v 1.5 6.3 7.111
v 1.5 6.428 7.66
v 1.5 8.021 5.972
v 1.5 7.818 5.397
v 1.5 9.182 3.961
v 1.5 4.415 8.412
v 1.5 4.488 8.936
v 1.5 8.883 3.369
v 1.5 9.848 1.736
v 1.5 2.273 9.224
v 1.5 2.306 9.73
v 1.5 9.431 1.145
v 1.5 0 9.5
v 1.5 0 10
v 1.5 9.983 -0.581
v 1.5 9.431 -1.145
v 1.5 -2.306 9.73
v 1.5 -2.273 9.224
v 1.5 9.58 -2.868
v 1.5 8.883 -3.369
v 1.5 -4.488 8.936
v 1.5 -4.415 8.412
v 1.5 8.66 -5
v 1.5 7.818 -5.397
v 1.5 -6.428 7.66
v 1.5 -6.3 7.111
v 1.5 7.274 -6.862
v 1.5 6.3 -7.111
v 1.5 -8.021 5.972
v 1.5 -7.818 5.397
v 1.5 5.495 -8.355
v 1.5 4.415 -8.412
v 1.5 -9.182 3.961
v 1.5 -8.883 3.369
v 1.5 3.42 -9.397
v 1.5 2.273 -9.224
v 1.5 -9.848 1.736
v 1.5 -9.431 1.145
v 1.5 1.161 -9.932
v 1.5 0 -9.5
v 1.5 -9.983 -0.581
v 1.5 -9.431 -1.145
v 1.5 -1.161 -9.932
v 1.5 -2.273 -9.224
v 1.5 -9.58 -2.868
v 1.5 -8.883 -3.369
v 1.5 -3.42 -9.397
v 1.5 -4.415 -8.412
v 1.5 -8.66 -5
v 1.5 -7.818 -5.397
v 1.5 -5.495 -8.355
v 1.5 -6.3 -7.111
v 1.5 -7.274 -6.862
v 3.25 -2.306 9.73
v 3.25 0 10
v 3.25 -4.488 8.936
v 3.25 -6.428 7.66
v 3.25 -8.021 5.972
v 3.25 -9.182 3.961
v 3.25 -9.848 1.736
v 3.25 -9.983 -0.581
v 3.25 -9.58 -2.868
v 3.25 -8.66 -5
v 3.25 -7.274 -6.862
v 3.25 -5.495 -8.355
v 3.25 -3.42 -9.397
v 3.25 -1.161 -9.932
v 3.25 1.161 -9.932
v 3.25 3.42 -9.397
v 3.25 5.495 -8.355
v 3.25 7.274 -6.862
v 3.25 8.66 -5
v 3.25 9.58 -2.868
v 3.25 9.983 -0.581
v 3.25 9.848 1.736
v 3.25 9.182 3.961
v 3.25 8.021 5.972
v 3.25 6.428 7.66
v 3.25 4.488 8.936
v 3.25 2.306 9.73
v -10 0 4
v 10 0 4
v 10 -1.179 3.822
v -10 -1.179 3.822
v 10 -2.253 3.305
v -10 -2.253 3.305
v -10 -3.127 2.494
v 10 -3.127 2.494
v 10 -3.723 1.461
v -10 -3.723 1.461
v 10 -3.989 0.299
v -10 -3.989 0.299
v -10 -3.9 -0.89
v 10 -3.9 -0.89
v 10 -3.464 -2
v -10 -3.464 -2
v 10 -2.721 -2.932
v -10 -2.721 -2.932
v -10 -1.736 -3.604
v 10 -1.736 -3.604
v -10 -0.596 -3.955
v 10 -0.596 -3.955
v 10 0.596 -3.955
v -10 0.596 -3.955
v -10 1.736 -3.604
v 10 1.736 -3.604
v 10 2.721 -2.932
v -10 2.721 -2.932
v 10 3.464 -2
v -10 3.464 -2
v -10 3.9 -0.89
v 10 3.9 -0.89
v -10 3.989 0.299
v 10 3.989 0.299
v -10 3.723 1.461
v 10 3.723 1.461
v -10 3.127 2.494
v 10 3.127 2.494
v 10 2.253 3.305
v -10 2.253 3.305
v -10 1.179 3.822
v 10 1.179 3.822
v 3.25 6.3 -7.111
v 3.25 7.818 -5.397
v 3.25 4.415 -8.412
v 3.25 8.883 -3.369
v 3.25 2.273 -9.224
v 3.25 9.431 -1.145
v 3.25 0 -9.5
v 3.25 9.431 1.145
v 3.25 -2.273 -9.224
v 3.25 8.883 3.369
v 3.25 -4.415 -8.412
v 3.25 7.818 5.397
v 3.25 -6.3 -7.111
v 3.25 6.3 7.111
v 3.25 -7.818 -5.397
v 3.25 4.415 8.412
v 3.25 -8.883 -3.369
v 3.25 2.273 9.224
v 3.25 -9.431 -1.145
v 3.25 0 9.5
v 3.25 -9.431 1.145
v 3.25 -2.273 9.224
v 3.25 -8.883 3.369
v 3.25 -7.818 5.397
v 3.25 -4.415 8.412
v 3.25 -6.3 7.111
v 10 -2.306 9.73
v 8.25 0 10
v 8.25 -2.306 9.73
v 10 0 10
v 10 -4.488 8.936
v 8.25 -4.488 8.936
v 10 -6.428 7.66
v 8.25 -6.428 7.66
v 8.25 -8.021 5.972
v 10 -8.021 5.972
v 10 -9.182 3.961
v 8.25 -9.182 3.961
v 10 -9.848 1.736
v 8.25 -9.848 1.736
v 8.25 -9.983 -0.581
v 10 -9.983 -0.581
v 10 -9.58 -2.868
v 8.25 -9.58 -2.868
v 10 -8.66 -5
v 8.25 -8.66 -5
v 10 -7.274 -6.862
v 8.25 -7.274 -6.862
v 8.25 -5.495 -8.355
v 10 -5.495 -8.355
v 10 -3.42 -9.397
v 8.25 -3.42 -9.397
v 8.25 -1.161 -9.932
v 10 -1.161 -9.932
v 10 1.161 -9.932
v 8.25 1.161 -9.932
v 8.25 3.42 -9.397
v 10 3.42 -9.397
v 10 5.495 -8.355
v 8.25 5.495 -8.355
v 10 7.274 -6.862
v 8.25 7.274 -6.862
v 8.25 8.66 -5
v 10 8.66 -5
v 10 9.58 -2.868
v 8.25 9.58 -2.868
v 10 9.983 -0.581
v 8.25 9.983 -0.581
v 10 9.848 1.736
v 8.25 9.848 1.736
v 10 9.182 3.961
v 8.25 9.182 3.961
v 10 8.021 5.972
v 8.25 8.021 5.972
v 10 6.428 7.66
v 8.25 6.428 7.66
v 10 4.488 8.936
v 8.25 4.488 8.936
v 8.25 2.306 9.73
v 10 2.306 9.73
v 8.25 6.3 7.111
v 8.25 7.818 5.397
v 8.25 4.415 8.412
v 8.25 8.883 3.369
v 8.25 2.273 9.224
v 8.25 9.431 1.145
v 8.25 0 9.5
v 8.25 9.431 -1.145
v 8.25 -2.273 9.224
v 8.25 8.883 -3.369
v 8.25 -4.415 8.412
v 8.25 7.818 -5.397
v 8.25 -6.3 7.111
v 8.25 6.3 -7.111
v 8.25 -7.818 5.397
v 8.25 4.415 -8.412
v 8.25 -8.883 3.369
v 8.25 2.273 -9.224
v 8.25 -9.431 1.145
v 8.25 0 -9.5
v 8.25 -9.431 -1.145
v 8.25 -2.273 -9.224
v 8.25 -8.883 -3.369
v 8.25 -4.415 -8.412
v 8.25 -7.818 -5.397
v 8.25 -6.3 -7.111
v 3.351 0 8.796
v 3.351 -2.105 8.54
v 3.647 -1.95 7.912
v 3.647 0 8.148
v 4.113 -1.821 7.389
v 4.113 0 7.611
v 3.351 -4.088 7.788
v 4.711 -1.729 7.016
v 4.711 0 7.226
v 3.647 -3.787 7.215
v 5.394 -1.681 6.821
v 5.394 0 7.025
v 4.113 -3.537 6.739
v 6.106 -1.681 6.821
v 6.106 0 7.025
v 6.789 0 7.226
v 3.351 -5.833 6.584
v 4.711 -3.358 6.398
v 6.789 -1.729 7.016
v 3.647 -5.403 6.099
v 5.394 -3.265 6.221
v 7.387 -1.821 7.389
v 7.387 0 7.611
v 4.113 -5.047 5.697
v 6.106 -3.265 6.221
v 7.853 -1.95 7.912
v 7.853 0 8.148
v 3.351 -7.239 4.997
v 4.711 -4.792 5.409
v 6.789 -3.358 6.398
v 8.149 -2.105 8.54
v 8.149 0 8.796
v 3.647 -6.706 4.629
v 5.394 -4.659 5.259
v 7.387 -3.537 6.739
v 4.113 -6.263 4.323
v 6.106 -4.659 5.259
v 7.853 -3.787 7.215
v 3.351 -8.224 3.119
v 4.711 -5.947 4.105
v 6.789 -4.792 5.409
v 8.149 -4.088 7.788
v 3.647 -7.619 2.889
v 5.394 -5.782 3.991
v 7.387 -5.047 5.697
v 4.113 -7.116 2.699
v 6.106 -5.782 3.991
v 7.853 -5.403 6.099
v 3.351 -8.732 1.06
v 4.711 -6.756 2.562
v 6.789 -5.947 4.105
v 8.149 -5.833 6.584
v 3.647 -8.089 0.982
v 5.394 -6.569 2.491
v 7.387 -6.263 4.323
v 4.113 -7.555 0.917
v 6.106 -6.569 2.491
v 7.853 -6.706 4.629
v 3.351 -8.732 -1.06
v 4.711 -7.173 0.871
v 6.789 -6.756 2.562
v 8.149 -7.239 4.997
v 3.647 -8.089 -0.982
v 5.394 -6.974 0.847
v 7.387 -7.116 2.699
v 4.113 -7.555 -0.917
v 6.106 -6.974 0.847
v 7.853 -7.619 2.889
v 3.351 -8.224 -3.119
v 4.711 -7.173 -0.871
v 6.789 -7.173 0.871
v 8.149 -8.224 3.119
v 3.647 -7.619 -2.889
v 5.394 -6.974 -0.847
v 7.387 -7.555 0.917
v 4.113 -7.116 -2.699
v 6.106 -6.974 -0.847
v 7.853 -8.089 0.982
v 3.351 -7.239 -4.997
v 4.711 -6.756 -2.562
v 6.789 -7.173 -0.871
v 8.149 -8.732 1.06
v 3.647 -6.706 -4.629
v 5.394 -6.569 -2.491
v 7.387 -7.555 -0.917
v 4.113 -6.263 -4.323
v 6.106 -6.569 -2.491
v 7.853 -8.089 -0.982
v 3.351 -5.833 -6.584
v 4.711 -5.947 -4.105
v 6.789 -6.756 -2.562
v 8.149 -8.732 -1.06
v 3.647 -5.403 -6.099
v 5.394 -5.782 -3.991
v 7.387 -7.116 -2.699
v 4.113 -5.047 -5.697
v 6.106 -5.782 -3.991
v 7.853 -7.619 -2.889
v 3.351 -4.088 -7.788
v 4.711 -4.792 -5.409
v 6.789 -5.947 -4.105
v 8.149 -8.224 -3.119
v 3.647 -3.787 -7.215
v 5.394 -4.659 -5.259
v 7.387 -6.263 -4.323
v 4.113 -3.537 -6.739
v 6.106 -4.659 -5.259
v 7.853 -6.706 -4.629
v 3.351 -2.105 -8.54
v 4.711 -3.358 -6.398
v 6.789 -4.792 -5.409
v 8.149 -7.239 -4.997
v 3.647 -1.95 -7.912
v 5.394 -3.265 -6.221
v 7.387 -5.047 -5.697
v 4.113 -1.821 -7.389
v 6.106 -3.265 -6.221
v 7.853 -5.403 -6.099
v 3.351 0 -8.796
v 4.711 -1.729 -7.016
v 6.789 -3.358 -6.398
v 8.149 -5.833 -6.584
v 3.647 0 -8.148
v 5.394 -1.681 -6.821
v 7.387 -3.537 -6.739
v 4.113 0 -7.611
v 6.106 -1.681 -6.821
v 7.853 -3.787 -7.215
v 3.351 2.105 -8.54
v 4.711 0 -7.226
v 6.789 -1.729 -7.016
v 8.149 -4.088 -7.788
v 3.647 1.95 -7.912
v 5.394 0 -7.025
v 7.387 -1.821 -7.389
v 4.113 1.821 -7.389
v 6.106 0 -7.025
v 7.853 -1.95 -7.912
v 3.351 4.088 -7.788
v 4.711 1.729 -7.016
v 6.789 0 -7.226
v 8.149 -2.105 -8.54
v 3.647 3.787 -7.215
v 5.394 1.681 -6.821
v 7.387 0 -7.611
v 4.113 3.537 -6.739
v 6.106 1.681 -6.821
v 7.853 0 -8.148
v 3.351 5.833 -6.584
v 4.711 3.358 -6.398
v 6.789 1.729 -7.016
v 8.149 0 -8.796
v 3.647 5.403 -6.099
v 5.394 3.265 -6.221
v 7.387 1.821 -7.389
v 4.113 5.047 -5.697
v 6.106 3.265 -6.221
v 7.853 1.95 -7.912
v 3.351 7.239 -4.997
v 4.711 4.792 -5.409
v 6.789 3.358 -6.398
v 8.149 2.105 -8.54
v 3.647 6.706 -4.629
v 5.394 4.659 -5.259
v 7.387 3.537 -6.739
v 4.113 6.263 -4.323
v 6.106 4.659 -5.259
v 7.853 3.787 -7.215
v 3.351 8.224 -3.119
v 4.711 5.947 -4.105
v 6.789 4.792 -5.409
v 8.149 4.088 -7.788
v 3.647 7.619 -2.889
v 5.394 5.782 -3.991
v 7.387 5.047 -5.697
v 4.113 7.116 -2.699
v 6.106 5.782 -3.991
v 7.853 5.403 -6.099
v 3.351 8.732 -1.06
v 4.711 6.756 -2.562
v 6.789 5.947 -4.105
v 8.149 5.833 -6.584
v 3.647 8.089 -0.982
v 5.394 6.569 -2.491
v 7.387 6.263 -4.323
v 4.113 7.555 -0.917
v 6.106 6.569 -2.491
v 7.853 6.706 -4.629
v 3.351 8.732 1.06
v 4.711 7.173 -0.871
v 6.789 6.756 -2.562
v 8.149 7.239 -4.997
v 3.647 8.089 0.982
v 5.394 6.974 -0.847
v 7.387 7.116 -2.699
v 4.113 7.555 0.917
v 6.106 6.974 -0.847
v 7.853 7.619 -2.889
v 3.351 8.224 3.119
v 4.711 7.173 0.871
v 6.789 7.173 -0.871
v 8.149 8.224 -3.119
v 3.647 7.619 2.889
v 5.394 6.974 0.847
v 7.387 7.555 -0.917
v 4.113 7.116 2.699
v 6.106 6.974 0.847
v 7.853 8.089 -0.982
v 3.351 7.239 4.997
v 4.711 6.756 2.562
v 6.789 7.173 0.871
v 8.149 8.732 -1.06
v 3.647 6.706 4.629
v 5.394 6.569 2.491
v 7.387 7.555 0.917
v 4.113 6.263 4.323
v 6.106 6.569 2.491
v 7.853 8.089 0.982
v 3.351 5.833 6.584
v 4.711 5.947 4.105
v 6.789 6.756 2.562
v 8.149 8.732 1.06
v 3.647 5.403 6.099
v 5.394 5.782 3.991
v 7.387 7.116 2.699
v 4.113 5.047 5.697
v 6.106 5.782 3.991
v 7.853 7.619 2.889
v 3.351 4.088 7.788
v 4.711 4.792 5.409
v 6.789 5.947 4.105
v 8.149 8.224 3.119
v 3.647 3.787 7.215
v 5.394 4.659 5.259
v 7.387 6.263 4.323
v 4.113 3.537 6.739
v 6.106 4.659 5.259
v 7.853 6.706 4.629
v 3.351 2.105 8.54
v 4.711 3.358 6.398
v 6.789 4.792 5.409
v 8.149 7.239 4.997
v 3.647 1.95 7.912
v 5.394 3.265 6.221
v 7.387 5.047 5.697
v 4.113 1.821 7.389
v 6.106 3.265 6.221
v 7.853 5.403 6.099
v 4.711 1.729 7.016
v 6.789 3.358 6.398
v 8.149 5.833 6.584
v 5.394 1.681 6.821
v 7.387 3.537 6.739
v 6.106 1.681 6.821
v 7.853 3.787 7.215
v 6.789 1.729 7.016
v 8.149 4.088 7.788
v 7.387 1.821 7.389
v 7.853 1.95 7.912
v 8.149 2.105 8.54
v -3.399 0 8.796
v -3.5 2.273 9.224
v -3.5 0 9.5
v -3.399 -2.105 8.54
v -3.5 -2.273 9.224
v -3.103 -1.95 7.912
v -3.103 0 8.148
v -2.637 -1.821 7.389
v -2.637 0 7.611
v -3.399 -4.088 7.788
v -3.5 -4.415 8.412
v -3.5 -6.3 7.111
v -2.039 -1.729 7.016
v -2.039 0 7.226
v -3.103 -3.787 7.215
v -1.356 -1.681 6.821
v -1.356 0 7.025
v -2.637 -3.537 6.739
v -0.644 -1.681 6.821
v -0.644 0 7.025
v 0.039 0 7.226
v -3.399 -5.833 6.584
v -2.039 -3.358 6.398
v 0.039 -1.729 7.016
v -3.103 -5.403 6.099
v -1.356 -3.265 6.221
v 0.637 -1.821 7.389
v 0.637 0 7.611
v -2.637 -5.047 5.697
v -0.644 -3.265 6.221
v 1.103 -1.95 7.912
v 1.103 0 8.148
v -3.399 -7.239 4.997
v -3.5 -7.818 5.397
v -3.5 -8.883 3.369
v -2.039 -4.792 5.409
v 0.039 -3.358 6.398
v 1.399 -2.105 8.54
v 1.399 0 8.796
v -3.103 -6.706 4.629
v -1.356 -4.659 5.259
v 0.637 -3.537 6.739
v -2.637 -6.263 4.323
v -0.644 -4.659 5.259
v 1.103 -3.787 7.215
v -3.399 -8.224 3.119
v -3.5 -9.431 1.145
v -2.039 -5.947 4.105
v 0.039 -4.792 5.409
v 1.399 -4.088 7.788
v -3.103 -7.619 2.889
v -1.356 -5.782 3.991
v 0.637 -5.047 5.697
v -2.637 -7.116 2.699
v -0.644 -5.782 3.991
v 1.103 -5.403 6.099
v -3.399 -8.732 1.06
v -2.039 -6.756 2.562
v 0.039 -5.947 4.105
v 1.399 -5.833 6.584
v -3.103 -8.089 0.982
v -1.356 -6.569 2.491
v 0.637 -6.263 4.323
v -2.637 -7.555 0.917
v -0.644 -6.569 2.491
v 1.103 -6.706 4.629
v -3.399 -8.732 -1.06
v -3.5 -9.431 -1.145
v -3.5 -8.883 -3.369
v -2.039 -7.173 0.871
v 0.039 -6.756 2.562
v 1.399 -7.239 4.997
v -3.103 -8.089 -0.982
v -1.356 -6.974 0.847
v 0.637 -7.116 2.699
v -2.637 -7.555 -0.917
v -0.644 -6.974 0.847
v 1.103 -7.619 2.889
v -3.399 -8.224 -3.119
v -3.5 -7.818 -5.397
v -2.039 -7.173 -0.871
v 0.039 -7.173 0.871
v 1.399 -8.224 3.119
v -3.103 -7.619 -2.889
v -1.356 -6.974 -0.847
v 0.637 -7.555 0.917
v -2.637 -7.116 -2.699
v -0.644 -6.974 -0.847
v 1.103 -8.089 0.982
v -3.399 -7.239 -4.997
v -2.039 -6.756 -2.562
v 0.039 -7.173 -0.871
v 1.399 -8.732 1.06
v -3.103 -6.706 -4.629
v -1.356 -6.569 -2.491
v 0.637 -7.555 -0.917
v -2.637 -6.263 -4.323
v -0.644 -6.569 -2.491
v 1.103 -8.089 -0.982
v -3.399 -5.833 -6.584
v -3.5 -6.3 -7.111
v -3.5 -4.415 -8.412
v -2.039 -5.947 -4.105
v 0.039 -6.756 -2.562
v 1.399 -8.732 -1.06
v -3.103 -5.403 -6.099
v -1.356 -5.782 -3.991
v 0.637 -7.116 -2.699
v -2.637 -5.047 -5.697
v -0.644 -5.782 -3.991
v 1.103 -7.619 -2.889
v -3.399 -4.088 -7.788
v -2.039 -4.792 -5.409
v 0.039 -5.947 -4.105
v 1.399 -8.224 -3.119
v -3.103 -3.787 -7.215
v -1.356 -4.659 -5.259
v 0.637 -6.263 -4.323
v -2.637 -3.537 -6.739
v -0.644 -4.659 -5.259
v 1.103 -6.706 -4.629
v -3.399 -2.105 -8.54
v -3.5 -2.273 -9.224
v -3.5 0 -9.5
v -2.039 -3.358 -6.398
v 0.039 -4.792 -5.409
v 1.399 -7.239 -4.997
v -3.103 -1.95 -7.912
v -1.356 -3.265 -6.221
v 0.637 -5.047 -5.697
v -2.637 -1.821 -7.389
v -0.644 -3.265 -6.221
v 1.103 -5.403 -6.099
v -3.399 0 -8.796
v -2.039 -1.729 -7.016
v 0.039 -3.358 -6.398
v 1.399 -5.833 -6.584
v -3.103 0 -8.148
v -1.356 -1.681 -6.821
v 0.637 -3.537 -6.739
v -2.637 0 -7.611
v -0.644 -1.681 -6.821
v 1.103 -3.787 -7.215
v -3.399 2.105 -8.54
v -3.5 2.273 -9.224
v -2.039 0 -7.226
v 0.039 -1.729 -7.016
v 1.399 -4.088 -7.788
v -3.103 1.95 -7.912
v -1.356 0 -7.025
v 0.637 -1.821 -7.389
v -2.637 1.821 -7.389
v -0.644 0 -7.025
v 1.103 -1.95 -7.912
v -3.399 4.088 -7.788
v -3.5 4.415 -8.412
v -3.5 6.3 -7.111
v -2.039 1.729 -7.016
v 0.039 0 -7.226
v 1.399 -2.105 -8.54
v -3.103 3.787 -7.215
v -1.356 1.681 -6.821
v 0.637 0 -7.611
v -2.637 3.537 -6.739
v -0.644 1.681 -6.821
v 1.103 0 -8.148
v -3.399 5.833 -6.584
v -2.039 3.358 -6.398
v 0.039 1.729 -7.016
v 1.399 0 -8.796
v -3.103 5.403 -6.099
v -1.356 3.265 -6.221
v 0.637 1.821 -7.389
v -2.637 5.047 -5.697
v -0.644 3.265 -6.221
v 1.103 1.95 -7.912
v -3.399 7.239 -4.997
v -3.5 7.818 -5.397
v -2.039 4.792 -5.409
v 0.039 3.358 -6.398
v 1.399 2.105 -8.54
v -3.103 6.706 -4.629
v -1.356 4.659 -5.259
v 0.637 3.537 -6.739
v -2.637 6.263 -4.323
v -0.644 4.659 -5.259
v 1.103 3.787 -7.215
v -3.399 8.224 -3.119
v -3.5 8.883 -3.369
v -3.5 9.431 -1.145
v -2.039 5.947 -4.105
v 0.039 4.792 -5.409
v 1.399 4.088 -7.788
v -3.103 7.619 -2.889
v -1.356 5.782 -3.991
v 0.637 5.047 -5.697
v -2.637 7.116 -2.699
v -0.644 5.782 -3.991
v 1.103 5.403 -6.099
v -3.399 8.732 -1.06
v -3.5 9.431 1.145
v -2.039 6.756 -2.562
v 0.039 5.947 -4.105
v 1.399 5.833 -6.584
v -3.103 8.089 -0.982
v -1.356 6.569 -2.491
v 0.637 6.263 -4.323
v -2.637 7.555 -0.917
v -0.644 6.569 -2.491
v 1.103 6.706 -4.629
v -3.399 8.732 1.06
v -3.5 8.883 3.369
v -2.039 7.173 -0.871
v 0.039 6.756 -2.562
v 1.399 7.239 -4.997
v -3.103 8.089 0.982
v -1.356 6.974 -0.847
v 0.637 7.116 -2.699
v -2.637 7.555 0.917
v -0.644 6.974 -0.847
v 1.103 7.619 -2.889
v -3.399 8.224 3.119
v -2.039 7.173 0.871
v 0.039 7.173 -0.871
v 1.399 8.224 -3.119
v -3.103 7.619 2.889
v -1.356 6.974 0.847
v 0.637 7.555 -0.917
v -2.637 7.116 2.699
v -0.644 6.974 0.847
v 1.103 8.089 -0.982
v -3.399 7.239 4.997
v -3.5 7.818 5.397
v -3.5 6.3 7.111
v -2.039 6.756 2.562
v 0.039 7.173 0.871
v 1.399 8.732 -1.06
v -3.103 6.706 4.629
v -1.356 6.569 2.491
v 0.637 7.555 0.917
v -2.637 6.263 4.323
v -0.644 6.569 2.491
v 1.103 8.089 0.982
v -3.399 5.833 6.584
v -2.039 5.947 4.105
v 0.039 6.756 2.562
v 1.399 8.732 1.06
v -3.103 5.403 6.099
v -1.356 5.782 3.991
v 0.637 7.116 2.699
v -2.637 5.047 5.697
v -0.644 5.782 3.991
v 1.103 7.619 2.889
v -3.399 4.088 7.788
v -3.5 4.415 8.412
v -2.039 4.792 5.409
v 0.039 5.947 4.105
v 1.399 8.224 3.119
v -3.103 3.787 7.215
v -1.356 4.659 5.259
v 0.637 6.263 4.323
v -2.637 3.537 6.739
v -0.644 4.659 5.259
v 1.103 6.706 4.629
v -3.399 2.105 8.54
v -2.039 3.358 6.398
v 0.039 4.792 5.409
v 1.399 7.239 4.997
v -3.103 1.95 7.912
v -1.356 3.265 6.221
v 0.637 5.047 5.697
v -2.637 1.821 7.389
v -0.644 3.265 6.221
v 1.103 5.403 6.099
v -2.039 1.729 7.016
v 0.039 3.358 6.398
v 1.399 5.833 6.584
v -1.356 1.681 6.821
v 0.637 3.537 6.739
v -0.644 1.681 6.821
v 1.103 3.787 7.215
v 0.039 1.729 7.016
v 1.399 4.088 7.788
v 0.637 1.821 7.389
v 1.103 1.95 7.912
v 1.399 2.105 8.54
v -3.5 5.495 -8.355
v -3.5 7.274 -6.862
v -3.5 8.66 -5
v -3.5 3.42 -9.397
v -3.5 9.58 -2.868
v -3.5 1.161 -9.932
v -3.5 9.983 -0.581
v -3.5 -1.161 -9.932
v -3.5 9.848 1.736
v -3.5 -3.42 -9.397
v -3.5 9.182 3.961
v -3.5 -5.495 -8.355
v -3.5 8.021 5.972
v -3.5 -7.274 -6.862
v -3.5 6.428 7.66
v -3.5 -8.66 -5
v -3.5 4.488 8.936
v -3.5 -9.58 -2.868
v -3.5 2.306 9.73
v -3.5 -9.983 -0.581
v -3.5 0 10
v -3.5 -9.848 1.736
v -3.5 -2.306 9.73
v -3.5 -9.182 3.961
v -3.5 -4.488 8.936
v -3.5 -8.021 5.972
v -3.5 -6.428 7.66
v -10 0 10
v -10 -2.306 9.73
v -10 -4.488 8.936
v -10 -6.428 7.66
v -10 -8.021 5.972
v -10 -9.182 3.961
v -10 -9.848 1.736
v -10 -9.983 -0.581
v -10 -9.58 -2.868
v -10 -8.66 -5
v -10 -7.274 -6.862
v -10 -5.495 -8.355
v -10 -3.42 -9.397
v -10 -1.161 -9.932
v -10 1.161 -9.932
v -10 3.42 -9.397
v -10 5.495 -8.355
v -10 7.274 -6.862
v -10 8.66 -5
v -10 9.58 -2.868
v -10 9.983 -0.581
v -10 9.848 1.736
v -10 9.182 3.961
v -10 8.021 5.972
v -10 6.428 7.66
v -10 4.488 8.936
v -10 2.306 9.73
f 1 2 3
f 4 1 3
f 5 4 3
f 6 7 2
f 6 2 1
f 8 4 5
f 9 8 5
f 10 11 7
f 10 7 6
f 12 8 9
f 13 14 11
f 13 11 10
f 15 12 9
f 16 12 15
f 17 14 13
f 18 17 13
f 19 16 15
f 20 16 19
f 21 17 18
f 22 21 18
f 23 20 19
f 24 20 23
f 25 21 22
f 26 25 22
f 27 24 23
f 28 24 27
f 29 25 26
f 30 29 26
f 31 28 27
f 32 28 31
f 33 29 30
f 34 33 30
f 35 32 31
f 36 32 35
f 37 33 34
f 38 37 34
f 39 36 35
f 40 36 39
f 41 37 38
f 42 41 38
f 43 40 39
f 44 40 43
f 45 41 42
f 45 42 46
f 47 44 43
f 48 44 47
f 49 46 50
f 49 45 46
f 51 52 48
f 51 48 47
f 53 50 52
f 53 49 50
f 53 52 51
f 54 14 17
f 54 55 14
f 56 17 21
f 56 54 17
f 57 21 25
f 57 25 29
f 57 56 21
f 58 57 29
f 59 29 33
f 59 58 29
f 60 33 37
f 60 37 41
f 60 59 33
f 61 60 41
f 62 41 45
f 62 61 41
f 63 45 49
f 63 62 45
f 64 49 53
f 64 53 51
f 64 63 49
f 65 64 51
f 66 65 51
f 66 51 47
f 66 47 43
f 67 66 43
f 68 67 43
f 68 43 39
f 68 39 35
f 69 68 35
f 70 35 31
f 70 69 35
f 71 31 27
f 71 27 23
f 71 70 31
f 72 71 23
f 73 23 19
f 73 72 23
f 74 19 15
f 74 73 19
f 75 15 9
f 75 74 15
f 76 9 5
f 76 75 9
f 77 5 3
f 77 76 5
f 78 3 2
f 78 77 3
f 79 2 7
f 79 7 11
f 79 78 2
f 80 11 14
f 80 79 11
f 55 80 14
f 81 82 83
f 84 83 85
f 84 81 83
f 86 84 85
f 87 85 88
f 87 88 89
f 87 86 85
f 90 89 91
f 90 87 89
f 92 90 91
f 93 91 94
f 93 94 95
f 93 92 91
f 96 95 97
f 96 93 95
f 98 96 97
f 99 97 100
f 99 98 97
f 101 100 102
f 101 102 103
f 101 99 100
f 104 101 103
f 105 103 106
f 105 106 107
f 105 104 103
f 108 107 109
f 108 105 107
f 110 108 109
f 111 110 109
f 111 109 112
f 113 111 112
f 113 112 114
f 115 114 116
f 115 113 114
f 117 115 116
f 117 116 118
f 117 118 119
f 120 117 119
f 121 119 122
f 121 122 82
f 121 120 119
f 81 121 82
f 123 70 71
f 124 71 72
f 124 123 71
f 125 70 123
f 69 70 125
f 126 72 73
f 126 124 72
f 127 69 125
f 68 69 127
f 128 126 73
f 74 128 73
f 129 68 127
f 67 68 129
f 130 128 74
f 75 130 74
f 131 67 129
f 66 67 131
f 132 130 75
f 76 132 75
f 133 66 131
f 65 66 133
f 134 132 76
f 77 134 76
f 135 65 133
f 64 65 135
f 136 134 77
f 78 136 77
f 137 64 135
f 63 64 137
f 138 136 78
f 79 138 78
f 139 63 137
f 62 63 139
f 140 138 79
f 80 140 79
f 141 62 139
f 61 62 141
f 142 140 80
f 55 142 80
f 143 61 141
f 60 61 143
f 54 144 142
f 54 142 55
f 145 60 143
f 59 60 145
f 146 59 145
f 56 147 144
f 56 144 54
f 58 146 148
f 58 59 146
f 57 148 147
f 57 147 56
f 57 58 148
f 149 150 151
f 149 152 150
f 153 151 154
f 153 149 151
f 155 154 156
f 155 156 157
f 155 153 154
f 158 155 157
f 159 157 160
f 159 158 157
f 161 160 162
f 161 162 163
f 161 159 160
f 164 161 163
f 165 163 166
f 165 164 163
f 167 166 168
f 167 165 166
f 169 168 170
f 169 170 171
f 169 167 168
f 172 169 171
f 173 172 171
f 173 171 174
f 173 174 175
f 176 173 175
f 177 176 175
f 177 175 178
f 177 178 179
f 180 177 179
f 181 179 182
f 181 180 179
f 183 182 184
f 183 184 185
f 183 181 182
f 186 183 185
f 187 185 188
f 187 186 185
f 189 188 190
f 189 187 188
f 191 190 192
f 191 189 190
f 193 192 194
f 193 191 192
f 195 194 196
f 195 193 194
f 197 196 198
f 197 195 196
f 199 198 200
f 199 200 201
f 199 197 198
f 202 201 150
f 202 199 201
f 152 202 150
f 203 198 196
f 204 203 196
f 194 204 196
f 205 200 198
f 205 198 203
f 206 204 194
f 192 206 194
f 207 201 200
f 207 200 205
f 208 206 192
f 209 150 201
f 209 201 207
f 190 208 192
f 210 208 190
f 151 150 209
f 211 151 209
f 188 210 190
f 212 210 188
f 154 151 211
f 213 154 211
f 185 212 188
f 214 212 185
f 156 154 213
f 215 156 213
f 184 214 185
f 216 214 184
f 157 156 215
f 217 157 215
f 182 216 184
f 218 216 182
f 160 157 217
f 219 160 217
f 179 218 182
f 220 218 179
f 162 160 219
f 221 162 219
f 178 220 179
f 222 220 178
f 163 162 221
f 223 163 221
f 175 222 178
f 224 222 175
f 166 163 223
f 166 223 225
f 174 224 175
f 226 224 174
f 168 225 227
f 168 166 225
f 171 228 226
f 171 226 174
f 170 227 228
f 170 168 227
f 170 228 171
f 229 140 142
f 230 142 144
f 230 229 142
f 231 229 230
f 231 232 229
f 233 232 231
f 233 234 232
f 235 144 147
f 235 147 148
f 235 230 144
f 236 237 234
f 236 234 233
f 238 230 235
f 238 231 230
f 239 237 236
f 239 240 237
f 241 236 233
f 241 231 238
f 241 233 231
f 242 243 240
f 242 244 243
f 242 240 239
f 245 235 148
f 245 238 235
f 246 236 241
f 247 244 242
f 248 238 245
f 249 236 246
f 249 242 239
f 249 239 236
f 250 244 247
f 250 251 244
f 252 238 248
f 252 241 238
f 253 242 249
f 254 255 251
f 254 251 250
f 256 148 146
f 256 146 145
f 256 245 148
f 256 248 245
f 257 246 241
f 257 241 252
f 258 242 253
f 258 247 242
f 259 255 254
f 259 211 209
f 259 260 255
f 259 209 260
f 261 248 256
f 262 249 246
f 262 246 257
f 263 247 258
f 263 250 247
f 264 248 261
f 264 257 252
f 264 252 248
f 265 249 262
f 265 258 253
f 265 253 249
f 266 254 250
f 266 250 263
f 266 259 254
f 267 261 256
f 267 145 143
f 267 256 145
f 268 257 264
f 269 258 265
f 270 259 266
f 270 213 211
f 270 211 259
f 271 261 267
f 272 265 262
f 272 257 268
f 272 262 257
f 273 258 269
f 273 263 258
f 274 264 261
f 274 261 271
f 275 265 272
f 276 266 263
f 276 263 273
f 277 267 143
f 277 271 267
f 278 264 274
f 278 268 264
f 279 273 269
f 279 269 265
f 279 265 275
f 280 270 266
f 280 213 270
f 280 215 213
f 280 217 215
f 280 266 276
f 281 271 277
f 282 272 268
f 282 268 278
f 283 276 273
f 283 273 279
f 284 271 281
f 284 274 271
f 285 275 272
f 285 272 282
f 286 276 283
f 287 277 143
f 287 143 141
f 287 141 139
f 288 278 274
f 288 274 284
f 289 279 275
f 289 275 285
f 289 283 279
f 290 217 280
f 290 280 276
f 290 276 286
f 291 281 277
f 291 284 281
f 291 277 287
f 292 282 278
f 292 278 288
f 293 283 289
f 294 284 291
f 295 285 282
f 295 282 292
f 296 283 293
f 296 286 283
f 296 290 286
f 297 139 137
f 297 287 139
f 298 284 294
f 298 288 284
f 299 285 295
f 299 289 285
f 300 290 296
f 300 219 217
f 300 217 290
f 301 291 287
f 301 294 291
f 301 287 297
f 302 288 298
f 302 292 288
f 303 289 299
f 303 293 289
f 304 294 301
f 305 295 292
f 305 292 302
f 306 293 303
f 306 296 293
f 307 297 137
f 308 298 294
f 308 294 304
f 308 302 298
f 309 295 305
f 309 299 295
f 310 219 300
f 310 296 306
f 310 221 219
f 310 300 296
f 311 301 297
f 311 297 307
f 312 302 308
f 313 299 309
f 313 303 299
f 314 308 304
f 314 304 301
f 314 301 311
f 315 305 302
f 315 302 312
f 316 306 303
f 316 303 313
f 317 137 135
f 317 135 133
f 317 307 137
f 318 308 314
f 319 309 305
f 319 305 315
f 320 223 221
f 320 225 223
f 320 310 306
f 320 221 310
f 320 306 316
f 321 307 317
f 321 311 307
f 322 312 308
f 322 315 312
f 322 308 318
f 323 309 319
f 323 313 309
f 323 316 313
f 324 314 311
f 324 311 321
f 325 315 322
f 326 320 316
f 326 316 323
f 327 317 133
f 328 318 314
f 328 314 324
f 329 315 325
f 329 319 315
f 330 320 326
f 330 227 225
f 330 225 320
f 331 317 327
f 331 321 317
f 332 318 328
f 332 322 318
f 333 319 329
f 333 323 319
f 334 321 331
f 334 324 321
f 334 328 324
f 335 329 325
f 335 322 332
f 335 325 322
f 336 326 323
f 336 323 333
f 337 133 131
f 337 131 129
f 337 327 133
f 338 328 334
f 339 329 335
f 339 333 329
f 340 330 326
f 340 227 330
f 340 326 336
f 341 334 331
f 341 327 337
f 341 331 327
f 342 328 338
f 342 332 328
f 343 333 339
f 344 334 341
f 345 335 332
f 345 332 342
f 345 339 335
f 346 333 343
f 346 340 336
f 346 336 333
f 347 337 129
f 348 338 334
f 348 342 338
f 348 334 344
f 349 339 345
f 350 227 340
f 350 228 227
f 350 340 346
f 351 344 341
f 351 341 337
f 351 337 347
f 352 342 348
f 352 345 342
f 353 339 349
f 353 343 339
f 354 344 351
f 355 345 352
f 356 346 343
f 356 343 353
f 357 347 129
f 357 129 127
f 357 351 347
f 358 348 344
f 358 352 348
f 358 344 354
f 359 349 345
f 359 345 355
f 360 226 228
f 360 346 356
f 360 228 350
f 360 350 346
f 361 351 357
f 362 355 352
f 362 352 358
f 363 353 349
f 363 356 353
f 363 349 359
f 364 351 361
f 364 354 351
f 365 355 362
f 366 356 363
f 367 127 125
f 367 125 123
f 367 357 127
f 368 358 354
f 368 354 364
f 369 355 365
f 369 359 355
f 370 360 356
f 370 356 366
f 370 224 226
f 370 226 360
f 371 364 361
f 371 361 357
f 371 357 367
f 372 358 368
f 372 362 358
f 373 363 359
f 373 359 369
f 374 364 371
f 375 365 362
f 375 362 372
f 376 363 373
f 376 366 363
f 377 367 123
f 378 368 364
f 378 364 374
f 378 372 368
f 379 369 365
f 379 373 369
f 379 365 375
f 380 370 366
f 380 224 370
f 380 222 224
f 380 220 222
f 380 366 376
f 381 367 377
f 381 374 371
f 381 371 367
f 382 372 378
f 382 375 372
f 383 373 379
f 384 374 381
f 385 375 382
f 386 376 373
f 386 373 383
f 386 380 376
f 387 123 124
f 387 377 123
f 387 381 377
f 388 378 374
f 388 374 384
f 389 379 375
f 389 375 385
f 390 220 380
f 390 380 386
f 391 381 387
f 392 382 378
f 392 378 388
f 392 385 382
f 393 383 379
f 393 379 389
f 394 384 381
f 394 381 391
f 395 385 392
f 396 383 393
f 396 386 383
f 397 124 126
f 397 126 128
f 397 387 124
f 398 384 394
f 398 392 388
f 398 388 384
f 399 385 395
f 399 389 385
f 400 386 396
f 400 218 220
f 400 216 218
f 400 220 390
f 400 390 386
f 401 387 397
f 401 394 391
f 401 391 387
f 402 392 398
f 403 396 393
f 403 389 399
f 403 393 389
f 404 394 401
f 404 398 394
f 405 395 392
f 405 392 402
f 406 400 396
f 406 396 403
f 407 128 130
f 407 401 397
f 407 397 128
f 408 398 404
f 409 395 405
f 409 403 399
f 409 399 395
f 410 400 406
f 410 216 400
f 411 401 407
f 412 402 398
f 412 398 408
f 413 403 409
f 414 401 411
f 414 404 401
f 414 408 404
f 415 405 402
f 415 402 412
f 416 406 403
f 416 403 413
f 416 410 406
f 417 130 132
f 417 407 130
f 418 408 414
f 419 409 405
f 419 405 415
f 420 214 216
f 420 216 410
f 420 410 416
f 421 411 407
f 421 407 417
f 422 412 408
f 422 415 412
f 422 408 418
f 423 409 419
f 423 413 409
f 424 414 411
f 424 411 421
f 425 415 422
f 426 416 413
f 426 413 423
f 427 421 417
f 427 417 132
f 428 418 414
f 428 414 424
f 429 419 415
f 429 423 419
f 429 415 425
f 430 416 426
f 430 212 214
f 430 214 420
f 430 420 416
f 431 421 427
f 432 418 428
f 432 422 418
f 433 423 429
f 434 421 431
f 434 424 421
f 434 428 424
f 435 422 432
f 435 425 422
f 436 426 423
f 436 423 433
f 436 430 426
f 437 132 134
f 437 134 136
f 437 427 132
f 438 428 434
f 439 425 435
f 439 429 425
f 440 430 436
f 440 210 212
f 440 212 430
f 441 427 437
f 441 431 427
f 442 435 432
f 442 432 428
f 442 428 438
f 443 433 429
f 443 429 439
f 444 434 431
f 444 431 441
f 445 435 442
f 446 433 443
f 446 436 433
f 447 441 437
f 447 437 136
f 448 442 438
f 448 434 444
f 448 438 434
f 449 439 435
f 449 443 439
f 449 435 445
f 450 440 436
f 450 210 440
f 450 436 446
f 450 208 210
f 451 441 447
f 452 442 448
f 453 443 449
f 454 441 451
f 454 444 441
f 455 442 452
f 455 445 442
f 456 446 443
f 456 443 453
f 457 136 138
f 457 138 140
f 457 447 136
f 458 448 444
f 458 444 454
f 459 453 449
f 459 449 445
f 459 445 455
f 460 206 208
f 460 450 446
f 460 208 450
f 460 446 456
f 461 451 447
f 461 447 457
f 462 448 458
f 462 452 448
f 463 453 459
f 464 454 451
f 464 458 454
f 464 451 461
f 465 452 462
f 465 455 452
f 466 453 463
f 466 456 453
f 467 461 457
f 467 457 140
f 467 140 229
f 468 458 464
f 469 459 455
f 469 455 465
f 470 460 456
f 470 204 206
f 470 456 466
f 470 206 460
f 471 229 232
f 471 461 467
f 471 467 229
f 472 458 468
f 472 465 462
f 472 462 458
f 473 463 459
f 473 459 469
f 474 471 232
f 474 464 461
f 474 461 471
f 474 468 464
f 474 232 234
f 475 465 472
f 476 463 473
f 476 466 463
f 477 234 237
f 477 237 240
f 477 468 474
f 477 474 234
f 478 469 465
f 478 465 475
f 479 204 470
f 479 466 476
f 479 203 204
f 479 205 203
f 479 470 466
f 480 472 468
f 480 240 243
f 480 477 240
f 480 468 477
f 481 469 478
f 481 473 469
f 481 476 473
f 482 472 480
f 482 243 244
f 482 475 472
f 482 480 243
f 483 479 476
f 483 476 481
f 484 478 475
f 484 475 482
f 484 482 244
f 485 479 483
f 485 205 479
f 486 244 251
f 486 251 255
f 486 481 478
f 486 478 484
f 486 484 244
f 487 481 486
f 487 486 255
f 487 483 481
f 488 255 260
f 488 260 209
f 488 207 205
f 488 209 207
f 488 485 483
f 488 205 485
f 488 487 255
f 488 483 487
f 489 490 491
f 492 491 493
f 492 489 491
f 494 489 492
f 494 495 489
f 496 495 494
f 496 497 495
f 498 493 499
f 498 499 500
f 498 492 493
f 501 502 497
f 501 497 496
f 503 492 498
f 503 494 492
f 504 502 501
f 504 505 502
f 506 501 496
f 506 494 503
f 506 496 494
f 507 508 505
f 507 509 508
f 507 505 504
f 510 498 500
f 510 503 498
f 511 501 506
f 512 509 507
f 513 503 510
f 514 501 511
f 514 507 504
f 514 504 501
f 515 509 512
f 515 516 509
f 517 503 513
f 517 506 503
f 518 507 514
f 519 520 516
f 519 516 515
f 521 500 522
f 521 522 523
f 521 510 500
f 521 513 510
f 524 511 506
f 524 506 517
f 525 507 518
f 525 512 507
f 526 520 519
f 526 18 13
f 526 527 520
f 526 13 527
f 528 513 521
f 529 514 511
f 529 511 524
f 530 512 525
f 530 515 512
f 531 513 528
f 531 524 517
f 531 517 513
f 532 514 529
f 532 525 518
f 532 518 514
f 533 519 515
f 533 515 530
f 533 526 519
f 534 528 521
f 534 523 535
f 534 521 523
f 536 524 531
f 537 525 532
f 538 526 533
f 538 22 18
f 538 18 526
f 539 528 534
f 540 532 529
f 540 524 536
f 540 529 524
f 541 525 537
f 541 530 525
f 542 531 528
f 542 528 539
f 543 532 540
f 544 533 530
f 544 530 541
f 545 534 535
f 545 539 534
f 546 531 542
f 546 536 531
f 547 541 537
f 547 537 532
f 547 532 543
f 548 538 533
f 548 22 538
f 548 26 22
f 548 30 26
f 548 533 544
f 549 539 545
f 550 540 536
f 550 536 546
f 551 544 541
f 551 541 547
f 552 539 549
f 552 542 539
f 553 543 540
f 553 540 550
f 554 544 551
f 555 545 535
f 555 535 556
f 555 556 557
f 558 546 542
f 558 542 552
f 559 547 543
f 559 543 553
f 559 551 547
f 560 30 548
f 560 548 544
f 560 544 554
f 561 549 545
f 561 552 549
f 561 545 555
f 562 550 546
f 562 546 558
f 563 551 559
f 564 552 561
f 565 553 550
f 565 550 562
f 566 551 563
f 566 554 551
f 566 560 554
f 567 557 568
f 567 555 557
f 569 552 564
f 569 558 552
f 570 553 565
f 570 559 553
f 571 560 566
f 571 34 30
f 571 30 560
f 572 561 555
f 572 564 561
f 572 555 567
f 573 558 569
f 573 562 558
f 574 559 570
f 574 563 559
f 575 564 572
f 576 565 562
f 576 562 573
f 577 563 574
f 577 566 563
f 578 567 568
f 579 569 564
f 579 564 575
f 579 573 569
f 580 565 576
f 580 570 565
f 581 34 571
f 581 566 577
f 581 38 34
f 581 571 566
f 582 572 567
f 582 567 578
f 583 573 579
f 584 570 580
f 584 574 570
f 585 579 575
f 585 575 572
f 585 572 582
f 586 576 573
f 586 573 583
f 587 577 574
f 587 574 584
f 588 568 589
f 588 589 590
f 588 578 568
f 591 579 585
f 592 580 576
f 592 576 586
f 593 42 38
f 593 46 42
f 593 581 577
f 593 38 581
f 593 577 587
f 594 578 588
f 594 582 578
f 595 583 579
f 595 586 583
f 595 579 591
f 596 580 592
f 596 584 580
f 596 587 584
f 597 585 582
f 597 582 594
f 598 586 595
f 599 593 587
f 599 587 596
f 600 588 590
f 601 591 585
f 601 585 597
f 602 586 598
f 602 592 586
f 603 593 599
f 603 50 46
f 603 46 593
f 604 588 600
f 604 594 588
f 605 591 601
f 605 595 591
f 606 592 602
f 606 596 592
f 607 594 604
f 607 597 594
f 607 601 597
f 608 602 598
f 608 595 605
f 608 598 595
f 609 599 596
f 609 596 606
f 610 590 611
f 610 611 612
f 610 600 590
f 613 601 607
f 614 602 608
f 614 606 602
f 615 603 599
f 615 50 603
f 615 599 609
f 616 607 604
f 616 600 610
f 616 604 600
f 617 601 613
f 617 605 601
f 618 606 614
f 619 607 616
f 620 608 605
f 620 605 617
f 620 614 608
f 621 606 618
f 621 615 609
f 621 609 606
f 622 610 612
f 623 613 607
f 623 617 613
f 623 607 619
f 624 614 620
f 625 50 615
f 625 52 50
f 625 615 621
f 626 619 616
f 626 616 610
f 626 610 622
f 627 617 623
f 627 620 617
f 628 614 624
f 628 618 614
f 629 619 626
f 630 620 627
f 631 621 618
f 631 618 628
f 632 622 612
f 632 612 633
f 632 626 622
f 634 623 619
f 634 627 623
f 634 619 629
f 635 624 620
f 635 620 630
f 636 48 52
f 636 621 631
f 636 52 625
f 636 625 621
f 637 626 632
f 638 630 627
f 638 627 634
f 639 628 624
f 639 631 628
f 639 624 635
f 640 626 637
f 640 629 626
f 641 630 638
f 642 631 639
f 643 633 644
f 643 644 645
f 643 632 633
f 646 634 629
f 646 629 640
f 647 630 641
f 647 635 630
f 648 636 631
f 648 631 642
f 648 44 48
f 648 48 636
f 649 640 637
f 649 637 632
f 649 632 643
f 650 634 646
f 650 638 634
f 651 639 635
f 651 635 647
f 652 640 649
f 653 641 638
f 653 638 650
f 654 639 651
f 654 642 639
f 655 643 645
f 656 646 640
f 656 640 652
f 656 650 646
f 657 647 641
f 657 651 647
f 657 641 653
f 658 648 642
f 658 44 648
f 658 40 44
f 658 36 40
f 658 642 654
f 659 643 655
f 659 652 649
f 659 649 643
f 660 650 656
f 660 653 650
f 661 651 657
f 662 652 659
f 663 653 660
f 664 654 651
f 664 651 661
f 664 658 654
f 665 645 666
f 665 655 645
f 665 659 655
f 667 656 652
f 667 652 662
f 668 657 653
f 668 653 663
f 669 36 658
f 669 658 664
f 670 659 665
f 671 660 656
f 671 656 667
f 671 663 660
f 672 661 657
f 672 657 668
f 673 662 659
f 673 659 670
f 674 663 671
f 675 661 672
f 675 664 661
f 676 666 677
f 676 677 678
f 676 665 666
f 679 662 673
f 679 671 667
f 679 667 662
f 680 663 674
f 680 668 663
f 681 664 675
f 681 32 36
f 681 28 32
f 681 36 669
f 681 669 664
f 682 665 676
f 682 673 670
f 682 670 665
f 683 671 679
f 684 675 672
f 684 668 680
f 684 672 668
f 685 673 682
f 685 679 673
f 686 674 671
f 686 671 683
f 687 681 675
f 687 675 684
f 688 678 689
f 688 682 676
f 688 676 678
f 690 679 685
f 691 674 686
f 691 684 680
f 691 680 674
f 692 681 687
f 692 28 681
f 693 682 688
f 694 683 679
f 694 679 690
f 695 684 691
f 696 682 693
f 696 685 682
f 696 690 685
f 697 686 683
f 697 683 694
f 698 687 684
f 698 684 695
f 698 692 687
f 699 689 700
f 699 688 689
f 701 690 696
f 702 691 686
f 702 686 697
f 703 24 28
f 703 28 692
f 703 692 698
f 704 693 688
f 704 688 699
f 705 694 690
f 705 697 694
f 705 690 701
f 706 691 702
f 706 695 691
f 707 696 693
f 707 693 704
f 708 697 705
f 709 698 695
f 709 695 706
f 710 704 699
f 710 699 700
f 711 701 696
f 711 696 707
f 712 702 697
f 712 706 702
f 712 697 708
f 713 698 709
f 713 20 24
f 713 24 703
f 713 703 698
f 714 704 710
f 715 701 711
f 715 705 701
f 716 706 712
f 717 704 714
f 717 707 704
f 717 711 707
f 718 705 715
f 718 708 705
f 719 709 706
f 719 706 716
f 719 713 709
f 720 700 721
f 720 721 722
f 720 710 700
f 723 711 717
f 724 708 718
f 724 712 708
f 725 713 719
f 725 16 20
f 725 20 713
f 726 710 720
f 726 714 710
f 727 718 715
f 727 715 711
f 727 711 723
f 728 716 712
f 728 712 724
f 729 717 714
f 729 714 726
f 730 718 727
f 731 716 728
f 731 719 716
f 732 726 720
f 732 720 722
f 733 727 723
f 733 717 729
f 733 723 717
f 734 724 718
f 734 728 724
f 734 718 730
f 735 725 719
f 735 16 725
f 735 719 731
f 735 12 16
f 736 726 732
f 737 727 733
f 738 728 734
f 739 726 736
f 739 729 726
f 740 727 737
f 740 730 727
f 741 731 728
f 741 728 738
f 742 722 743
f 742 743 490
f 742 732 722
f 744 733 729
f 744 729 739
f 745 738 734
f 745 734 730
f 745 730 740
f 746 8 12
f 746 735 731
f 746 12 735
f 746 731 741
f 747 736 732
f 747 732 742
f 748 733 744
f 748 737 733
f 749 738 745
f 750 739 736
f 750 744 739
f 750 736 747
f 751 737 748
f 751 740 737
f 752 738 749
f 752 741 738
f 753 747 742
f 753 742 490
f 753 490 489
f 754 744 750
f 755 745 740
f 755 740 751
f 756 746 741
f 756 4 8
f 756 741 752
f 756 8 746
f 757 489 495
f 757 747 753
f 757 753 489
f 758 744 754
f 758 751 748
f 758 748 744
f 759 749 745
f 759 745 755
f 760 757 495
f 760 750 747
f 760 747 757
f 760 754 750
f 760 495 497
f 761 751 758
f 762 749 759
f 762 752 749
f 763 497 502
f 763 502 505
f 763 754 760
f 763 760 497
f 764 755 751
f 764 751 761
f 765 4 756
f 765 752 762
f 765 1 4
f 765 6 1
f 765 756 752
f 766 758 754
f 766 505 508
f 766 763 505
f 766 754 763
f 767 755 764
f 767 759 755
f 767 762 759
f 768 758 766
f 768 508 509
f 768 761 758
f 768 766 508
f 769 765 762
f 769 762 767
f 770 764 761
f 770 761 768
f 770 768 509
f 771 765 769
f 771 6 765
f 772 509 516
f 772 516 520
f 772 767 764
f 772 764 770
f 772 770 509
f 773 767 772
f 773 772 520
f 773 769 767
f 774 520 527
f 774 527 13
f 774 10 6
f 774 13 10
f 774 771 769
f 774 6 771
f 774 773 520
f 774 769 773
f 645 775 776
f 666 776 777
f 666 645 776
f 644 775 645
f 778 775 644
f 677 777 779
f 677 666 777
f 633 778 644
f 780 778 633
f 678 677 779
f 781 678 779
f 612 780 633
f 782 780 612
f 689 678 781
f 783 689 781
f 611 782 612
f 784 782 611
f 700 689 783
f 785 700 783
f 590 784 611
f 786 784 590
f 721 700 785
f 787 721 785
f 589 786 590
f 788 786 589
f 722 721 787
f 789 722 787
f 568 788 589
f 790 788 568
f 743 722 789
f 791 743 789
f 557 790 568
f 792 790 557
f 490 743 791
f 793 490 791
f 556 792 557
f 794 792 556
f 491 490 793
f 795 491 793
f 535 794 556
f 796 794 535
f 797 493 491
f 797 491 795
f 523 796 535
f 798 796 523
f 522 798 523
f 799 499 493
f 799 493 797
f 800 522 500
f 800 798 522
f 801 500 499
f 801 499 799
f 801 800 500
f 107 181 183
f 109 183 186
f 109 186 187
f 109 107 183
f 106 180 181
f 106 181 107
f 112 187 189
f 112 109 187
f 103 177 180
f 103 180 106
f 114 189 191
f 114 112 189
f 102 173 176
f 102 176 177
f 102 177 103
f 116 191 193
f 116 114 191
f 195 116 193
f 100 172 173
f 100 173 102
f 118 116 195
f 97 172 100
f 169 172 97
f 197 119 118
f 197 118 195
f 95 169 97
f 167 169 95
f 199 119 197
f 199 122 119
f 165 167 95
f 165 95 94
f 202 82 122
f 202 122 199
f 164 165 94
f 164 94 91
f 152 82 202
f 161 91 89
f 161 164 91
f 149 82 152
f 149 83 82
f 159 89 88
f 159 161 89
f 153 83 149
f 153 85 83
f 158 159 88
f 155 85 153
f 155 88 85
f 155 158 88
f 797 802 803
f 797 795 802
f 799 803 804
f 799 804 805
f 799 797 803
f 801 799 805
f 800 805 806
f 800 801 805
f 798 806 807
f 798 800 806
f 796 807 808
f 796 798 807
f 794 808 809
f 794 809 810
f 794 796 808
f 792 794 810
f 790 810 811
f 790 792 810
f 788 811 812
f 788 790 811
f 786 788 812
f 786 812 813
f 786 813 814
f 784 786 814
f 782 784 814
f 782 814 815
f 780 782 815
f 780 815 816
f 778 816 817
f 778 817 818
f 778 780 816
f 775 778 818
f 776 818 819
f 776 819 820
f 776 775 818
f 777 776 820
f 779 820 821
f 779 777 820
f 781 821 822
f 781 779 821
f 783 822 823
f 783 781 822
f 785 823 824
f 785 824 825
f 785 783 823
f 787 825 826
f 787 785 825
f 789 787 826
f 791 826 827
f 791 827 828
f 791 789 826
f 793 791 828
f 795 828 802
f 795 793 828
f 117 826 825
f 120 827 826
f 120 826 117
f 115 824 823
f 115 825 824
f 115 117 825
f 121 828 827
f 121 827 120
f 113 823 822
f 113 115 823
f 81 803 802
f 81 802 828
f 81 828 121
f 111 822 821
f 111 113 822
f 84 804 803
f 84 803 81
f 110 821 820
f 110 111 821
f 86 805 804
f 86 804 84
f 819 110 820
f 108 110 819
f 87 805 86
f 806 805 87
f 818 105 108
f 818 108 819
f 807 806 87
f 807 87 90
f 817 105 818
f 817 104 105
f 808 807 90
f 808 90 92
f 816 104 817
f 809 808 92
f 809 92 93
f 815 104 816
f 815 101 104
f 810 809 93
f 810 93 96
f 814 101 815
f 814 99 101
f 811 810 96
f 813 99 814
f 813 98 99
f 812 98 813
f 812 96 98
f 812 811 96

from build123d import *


with BuildPart() as part:
    # Sketch1 → Revolve1 (revolve)
    with BuildSketch(Plane(origin=(0, 0, 0), x_dir=(1, 0, 0), z_dir=(0, 1, 0)), mode=Mode.PRIVATE) as revolve1_sk:
        with BuildLine():
            Line((-3.5, 10), (-3.5, 9.5))
            ThreePointArc((-3.5, 9.5), (-1, 7), (1.5, 9.5))
            Line((1.5, 9.5), (1.5, 10))
            Line((1.5, 10), (3.25, 10))
            Line((3.25, 10), (3.25, 9.5))
            ThreePointArc((3.25, 9.5), (5.75, 7), (8.25, 9.5))
            Line((8.25, 9.5), (8.25, 10))
            Line((8.25, 10), (10, 10))
            Line((10, 10), (10, 4))
            Line((10, 4), (-10, 4))
            Line((-10, 4), (-10, 10))
            Line((-10, 10), (-3.5, 10))
        make_face()
    revolve(revolve1_sk.sketch.rotate(Axis((-17.222797871, 0, 0), (1, 0, 0)), 180), axis=Axis((-17.222797871, 0, 0), (1, 0, 0)))


solid = part.part
